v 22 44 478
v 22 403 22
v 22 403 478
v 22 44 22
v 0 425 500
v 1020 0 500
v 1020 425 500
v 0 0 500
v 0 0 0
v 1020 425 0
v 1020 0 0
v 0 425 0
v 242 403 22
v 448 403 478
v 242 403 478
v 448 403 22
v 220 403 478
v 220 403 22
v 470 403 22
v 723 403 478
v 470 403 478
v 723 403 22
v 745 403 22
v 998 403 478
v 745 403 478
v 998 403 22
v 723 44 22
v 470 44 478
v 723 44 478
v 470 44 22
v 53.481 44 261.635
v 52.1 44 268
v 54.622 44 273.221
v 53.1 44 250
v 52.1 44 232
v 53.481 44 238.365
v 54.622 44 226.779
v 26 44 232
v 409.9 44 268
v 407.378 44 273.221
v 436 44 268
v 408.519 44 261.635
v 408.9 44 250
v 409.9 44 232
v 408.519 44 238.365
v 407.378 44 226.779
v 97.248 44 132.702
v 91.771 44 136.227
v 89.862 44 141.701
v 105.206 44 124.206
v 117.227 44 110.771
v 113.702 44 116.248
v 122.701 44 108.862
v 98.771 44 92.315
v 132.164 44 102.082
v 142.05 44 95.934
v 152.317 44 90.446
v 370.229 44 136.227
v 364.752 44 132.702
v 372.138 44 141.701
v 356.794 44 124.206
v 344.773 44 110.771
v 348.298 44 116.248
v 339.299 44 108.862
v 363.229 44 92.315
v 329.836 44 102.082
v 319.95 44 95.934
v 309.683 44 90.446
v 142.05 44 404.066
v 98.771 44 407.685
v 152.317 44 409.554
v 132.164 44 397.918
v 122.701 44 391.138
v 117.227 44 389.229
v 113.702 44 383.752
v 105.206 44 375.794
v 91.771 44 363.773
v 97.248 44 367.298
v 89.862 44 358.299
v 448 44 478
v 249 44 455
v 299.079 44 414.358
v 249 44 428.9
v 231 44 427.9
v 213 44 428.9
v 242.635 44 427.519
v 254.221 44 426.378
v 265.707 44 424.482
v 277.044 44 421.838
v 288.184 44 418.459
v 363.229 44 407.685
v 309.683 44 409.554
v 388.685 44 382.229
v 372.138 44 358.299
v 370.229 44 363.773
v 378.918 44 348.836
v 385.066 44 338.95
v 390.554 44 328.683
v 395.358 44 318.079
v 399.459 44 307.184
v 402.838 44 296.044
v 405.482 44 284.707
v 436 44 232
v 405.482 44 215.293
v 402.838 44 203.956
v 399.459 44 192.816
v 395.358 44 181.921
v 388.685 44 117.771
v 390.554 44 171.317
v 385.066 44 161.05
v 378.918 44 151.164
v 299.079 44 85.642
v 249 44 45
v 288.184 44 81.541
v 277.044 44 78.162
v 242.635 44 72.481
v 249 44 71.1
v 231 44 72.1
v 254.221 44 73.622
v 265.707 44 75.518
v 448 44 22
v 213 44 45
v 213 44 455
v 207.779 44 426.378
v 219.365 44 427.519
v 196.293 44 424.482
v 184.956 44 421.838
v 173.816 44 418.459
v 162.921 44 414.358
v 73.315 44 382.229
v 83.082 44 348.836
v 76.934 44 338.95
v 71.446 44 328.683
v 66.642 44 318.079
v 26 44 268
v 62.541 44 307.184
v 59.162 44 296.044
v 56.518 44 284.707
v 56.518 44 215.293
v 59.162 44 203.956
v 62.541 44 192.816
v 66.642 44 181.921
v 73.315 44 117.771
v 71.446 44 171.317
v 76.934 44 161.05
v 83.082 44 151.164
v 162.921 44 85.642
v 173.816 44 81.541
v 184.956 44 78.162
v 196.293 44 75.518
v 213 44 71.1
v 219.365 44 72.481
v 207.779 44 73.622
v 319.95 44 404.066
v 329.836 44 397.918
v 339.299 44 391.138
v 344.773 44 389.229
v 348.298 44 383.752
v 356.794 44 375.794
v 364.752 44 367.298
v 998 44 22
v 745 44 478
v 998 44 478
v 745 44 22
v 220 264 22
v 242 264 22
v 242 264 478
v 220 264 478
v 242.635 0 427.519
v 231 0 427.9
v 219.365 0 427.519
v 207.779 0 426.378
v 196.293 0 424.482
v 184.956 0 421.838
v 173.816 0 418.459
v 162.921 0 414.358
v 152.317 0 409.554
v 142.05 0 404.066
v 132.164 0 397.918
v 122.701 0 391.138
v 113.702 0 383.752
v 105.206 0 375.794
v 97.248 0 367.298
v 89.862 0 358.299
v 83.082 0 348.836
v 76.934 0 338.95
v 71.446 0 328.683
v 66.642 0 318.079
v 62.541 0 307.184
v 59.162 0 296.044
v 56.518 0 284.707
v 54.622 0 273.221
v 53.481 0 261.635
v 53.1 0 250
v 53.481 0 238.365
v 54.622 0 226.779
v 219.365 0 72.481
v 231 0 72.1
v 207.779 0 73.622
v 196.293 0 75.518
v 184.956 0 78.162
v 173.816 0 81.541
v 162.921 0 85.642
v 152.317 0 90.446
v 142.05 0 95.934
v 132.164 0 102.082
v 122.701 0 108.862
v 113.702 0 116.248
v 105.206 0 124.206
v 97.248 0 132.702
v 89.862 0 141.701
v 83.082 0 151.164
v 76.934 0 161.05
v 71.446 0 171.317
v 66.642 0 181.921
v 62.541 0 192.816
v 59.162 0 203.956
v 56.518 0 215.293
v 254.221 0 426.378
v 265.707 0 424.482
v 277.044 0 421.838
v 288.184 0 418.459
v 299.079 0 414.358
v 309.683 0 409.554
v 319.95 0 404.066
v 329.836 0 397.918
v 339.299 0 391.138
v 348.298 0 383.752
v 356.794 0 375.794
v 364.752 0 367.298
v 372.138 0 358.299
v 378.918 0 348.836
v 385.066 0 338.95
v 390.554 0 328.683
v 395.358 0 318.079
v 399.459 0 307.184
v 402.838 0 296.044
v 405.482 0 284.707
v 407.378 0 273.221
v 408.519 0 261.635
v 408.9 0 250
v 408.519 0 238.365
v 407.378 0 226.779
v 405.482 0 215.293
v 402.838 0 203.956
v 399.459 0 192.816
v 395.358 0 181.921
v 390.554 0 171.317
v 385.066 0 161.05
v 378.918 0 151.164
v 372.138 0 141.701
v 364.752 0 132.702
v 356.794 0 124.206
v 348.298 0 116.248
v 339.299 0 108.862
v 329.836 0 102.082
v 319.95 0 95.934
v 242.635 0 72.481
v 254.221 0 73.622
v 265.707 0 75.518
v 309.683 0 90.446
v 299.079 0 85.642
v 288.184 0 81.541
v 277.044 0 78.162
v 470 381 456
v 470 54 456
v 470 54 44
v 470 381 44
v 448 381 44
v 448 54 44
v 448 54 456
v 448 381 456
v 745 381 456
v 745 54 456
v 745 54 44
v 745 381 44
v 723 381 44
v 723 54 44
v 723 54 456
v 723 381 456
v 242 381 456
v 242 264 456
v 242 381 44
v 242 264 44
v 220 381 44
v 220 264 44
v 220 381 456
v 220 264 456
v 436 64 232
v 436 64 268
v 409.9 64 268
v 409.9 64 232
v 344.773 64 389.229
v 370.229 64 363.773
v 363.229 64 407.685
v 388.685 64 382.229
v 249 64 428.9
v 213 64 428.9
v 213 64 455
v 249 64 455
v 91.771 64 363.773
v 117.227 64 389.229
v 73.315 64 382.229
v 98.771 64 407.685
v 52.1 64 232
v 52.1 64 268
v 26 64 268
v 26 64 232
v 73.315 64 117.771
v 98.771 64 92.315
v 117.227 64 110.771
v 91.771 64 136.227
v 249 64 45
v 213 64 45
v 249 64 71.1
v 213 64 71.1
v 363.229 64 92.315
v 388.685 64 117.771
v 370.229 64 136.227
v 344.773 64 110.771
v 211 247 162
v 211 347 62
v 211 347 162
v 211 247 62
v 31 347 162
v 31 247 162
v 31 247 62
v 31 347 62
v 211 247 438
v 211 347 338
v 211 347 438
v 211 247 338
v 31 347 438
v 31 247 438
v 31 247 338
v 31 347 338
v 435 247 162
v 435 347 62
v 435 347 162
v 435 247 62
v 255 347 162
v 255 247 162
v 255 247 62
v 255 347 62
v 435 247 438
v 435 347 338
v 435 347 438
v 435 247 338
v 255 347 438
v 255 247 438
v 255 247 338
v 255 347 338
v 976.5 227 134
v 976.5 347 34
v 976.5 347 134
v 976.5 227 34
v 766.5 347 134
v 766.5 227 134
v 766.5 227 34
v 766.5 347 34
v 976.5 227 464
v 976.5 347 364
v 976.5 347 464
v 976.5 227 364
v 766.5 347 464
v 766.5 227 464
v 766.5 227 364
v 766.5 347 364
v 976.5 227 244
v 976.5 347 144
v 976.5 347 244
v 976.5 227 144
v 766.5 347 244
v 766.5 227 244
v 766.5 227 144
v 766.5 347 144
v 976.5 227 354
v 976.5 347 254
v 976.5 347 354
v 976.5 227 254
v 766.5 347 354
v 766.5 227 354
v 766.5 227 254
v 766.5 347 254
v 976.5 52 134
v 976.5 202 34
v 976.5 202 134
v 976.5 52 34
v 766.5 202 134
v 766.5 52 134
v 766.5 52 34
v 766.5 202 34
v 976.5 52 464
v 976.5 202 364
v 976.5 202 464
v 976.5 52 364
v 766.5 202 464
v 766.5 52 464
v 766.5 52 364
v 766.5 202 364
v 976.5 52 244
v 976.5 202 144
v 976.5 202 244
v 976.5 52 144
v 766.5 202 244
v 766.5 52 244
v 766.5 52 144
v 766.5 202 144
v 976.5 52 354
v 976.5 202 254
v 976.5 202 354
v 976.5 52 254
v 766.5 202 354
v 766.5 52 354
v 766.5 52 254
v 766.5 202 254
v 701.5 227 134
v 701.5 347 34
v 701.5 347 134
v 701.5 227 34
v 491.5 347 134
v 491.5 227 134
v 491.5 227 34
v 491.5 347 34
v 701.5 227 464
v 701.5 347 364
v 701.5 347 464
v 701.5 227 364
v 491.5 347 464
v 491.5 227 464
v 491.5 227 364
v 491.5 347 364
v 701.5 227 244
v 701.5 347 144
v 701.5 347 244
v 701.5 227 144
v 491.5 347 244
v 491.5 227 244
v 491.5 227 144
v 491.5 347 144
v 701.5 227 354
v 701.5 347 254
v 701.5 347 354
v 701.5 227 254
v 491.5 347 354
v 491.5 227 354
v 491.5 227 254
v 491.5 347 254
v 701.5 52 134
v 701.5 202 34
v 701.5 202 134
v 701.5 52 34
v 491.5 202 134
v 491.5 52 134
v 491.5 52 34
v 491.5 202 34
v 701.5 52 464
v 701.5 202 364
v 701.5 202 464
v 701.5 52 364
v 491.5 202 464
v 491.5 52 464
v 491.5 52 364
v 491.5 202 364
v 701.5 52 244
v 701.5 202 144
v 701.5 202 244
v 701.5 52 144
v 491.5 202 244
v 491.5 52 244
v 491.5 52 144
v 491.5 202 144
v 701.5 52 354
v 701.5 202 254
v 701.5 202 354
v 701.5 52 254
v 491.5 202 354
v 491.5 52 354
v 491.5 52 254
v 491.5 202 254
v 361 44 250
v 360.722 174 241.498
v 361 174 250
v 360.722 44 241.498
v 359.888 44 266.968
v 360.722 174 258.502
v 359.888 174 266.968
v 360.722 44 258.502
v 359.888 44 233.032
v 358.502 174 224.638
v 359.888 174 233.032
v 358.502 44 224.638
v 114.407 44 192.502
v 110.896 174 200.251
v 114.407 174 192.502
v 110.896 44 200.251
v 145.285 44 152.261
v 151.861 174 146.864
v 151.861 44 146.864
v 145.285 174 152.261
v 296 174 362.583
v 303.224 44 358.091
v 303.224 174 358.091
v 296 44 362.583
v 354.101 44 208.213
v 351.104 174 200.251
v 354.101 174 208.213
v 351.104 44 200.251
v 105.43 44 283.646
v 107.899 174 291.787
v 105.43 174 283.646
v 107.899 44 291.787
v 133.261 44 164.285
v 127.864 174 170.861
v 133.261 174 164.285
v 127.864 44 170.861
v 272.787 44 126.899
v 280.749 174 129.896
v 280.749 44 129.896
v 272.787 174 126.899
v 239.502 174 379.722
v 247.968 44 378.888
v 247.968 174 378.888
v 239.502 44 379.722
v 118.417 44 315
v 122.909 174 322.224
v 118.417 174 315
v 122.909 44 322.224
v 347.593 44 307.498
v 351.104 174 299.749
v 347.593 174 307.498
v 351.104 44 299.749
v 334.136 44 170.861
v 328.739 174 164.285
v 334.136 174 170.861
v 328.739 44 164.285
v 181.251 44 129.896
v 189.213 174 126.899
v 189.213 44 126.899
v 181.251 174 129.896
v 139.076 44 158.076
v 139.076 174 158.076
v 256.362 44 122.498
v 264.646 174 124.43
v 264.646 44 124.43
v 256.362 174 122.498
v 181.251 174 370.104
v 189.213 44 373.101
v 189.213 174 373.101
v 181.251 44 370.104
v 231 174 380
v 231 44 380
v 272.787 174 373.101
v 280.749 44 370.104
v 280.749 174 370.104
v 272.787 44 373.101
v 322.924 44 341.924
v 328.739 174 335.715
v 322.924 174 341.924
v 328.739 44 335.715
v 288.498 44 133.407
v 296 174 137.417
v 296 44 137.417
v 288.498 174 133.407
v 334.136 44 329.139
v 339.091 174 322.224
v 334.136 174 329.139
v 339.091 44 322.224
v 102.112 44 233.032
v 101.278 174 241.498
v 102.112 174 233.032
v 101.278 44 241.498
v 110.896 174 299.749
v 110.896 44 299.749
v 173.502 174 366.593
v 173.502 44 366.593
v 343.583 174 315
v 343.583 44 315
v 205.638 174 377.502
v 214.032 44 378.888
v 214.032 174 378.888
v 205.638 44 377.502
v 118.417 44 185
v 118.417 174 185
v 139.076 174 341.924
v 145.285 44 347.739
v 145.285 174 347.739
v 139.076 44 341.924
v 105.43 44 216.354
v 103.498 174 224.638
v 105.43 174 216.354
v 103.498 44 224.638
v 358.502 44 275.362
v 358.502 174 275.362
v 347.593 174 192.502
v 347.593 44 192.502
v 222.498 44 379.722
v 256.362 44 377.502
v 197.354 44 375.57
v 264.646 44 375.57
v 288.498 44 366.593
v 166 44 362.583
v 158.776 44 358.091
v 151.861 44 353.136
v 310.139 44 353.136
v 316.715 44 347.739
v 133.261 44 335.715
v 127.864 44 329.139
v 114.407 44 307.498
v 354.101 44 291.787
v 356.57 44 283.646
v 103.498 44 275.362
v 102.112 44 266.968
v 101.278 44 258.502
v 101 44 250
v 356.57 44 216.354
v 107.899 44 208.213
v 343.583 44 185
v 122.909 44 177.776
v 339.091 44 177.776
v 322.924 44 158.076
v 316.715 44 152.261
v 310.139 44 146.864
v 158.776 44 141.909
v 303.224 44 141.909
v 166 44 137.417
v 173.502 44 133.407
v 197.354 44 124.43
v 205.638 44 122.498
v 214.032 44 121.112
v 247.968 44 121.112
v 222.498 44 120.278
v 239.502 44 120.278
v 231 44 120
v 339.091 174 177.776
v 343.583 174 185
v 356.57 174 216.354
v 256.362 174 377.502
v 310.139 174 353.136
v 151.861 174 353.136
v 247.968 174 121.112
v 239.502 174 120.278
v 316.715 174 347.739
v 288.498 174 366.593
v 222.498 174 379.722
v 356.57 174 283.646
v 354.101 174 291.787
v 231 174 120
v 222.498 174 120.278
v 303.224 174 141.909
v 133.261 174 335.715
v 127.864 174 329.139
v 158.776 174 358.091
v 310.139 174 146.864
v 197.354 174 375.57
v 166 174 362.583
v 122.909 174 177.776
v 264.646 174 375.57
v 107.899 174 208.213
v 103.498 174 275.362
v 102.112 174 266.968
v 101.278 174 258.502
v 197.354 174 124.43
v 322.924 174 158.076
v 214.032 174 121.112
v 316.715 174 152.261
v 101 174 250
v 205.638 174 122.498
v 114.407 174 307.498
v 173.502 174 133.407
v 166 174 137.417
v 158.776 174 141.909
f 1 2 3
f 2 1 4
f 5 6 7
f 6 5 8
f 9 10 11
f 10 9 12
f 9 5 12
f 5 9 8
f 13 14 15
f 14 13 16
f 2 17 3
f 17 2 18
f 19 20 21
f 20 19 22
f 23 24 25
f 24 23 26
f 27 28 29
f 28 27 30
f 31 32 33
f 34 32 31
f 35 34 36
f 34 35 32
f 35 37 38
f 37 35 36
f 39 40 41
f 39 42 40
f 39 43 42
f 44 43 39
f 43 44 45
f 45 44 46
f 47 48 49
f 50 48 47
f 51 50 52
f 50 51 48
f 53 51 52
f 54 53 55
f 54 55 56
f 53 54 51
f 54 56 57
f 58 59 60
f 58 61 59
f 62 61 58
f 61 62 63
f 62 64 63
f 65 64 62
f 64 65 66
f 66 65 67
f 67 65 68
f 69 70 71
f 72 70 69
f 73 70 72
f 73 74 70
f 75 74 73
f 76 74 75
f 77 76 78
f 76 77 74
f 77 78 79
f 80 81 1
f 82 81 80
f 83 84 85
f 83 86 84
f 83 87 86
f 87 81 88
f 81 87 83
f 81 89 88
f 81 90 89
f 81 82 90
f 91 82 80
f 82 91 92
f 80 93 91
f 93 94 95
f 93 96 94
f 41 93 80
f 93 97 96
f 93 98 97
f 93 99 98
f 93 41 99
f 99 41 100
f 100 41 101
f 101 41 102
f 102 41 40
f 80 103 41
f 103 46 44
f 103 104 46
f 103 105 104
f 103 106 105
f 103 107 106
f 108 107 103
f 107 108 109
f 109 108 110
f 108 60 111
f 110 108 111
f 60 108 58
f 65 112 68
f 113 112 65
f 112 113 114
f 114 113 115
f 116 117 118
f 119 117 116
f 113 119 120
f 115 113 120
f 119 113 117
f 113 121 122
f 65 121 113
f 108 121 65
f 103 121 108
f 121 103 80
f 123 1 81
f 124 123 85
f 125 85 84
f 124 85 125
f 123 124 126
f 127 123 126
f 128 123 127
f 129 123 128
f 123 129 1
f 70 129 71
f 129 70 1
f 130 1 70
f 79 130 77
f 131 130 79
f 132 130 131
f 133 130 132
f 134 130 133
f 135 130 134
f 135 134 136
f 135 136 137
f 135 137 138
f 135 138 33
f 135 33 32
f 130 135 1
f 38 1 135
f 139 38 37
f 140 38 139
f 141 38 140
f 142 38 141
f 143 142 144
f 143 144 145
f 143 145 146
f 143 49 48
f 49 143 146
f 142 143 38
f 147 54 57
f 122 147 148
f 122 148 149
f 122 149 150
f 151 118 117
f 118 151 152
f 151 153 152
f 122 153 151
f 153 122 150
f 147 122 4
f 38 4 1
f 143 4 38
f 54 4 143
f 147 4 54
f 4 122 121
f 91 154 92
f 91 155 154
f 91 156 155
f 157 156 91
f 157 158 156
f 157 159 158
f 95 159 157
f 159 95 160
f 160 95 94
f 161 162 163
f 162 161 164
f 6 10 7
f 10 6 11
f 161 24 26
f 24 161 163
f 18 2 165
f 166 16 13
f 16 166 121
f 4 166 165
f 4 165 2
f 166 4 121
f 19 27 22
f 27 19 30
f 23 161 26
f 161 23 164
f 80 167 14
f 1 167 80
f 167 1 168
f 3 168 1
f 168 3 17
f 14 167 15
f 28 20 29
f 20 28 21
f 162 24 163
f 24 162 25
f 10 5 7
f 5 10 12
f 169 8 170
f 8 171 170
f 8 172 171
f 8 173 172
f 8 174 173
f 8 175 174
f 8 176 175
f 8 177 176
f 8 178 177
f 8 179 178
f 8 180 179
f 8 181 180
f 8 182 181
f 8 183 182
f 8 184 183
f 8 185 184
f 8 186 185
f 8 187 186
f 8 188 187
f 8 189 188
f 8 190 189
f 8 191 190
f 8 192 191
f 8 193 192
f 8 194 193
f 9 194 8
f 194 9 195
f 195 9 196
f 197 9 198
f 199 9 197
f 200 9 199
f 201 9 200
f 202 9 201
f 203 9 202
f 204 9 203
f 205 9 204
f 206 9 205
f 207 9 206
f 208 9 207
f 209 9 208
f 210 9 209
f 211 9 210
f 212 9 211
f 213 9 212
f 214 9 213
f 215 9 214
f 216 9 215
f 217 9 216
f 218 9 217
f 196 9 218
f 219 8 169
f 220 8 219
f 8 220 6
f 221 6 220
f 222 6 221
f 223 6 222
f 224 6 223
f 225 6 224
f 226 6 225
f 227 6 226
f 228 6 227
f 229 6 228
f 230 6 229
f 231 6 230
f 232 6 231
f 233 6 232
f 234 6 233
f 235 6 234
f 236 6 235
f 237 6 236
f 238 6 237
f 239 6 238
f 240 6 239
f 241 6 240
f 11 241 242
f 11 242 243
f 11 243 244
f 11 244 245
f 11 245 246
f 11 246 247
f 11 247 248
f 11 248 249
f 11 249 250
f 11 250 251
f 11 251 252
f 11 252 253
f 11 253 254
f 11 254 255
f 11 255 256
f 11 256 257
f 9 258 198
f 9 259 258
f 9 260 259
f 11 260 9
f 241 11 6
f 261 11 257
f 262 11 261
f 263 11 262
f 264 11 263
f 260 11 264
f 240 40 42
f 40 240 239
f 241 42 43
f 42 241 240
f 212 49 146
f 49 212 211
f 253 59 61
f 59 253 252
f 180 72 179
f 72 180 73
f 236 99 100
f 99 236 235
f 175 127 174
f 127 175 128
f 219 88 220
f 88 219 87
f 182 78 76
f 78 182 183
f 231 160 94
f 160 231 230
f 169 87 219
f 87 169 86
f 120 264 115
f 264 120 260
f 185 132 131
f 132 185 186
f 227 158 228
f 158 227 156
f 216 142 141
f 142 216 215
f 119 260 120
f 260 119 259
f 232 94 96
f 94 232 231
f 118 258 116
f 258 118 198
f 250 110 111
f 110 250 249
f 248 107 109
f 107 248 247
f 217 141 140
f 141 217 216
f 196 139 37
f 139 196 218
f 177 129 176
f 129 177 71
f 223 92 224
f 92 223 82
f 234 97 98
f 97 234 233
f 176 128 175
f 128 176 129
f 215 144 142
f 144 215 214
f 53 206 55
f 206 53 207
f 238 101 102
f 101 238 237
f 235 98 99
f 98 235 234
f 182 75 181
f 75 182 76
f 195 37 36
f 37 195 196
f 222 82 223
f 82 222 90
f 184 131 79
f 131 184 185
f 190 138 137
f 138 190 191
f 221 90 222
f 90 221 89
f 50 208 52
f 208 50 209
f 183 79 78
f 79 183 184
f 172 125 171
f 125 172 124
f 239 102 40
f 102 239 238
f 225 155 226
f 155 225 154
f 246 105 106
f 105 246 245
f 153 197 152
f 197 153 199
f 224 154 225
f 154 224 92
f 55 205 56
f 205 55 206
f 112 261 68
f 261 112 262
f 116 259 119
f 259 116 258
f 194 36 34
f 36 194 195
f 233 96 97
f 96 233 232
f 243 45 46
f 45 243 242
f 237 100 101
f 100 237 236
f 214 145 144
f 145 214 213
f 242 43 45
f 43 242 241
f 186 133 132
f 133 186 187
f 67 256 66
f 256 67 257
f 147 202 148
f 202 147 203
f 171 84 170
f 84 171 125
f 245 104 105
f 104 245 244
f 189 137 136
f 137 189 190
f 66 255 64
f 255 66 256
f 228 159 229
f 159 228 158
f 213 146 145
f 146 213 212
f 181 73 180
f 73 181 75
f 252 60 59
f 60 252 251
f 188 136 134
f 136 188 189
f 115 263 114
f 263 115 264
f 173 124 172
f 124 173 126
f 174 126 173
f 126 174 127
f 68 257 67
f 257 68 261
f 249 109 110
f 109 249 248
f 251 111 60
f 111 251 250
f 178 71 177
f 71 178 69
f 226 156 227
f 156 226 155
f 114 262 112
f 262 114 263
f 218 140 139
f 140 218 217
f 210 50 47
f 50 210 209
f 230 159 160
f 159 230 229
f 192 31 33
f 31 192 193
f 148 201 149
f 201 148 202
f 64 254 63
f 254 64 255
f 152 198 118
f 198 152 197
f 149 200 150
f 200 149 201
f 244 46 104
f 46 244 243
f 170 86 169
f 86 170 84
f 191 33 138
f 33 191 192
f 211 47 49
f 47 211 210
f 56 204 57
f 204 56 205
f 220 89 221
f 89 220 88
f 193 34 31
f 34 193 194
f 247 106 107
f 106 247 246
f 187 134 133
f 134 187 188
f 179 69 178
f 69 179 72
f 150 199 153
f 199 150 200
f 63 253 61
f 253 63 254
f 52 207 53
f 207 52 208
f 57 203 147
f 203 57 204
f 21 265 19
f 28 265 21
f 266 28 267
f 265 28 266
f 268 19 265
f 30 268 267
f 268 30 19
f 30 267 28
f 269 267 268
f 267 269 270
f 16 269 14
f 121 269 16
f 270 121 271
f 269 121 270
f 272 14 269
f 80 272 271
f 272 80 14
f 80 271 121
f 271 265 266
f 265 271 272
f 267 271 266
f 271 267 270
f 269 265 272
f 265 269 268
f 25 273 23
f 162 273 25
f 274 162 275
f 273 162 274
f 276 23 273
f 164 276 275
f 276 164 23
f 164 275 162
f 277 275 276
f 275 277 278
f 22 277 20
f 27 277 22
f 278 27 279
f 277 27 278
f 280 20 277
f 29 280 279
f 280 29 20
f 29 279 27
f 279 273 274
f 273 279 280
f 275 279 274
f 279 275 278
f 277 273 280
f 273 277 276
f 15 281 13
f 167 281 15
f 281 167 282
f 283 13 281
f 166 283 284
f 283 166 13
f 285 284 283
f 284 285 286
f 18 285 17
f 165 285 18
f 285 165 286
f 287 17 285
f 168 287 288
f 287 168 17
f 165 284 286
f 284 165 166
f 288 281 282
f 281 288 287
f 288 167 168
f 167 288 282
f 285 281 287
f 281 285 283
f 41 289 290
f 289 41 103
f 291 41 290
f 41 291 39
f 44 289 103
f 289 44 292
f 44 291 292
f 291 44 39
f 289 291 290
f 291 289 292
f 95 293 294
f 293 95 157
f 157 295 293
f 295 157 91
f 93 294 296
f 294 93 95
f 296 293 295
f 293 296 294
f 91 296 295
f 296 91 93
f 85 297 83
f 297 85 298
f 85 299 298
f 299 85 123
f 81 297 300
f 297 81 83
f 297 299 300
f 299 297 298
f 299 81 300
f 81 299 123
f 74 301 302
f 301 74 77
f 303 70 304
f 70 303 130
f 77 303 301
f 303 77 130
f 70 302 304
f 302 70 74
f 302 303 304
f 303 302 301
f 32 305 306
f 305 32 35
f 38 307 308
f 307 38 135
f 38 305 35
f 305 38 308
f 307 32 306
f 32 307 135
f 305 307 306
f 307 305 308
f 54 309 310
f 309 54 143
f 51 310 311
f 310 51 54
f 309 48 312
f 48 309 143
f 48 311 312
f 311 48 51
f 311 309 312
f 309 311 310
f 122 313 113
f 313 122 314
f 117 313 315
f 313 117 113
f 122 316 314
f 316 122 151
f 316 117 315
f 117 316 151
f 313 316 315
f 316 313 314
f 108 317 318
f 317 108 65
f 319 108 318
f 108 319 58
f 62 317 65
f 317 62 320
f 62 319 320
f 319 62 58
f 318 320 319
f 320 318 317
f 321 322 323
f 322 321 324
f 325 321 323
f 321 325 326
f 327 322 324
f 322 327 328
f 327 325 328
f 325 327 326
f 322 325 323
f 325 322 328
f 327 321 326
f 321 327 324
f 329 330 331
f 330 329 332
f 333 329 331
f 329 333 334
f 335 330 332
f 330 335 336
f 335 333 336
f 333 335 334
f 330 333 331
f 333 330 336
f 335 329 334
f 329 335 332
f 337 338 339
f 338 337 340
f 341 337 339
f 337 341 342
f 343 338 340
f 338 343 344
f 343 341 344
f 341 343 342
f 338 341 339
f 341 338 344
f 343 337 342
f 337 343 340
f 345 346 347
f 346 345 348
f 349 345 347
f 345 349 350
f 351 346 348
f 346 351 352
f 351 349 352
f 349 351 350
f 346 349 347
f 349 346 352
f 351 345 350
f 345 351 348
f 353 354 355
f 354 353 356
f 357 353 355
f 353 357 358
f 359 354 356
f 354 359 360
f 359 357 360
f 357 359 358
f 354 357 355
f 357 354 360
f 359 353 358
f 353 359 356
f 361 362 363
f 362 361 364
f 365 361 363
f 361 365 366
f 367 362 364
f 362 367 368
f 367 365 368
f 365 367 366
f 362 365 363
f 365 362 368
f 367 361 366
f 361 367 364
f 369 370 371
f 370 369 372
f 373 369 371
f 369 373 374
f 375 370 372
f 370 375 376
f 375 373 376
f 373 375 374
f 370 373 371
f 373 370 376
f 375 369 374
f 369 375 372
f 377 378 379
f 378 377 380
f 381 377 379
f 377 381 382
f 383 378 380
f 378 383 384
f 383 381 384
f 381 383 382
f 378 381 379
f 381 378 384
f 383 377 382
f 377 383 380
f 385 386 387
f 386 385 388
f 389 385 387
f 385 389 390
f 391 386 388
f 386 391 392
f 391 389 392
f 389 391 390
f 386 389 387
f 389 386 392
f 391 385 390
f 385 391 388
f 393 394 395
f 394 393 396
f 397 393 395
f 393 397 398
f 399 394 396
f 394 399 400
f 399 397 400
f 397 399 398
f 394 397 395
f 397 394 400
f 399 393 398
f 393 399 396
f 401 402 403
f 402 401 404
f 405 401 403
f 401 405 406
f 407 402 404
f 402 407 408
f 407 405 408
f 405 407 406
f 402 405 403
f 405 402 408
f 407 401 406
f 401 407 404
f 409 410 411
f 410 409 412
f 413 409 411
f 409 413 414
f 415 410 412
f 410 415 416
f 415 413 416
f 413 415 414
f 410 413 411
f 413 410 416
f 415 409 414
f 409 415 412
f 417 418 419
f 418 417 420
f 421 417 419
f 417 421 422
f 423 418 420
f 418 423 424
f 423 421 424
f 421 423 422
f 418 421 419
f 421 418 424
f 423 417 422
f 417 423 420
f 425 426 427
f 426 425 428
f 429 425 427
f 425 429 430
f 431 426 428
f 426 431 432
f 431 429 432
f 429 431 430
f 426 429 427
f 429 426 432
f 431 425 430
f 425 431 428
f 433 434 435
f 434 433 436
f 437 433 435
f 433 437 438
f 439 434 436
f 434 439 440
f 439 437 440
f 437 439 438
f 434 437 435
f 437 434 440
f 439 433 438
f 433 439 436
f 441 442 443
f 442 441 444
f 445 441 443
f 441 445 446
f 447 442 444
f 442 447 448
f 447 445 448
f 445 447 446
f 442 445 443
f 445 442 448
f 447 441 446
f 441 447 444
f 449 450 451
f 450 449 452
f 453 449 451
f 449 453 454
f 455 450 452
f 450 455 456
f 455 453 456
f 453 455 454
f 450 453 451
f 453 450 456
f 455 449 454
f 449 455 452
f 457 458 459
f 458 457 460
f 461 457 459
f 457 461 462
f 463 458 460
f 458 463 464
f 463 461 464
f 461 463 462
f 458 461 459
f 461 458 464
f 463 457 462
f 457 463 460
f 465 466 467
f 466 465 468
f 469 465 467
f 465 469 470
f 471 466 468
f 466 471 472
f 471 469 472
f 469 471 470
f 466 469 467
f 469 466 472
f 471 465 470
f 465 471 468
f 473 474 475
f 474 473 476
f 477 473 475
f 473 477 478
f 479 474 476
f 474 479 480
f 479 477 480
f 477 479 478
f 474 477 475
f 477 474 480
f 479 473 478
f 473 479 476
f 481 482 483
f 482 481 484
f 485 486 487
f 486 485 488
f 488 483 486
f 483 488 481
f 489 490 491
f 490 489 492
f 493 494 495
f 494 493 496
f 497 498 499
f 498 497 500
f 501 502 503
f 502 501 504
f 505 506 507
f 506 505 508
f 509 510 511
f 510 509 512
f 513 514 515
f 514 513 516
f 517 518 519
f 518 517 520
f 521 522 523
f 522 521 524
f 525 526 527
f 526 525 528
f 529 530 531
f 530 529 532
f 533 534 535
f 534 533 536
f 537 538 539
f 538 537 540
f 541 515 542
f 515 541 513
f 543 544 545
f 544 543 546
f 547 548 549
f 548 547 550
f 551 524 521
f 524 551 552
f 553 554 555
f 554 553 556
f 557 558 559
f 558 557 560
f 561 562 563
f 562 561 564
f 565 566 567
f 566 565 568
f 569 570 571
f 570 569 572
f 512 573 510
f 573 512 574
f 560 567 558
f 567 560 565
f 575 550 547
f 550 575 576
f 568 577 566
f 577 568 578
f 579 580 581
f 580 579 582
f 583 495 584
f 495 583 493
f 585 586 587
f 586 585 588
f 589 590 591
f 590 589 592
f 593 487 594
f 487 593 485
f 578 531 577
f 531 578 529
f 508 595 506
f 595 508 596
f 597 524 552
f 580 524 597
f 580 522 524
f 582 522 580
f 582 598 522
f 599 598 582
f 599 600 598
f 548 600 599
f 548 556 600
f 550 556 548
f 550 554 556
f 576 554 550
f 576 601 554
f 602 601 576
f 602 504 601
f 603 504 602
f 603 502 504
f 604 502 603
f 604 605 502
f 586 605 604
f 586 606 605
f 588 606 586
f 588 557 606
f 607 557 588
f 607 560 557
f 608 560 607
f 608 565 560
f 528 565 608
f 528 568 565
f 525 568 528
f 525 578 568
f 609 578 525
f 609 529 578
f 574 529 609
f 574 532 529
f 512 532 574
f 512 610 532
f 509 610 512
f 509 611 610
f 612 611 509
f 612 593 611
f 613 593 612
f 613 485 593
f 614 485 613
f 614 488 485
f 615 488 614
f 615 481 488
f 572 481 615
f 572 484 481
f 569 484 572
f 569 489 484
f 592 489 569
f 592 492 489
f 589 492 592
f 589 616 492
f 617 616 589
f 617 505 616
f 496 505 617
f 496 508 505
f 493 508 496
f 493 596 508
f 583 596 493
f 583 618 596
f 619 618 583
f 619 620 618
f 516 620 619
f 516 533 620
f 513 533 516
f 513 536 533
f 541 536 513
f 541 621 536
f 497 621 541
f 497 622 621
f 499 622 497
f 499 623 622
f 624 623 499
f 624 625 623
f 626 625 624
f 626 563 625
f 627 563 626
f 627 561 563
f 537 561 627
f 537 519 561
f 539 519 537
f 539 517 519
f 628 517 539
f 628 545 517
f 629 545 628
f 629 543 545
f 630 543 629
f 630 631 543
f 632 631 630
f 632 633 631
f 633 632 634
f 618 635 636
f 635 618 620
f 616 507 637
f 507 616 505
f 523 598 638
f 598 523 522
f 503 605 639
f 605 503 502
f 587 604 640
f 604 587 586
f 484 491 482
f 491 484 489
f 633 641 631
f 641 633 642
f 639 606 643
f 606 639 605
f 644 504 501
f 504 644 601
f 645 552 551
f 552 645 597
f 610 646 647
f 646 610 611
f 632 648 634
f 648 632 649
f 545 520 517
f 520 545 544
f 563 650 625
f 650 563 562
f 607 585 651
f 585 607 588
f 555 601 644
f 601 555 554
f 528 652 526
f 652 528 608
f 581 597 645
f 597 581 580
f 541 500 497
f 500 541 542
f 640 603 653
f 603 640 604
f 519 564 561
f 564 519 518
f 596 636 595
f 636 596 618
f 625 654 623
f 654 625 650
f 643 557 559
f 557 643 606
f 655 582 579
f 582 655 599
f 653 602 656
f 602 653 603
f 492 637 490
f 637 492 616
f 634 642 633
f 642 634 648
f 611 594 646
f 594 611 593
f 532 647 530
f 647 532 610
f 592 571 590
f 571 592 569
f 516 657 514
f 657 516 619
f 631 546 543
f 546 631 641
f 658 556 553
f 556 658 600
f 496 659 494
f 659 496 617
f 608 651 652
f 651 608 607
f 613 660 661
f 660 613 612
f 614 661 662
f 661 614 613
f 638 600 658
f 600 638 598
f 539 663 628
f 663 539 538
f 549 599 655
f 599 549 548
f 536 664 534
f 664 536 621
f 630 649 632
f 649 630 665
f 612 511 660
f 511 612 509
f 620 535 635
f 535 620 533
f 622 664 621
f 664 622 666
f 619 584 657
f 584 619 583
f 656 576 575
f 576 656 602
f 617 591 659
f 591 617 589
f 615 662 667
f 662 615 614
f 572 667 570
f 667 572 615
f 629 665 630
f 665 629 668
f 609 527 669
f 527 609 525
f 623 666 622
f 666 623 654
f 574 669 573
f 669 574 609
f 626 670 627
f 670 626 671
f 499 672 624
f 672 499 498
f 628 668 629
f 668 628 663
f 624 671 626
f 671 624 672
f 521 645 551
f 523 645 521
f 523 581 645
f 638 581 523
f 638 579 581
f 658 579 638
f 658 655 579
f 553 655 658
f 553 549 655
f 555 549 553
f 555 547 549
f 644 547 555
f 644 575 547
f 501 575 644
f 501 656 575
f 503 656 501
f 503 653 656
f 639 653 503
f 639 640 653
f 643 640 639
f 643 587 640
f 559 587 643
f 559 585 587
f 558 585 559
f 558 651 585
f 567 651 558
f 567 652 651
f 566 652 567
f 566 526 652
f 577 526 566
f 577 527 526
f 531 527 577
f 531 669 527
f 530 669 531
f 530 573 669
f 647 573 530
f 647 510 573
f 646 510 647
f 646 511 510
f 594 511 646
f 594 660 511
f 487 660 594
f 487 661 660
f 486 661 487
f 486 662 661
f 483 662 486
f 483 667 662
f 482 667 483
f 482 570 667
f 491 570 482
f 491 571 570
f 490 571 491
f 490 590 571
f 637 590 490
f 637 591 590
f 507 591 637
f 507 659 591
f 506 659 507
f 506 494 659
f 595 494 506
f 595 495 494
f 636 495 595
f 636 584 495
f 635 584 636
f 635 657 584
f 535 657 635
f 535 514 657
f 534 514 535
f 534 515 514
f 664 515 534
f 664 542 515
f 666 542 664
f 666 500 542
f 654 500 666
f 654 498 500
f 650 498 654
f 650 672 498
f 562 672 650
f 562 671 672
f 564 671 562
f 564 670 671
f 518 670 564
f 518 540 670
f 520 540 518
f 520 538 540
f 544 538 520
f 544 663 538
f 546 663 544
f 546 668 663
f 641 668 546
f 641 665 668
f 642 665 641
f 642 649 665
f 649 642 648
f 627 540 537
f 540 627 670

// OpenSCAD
// K02, 2026-11-03. P30E cabinet + eight K01 local pads, reference model ONLY.
// NOT CNC: manufacturer 3D basket, terminal, seal, locks, fasteners and glue unverified.
// x global left->right; y outer front->rear; z bottom->top. All dimensions in mm.
$fn=96;
state_liters=100; // [100,120,150]
pad_depth=20;    // [20:30], K02 passage comparison; 20 preferable only for geometric access
show_shell=true;
show_modules=true;
show_braces=true;
show_pads=true;
show_driver_envelope=true;
W=1020;D=425;H=500;front=44;wall=22;
cx=231;cz=250;
R1=178.9;R2=205;pad_width=36;
assert(state_liters==100||state_liters==120||state_liters==150);
assert(pad_depth==20||pad_depth==30);
// reference P30E interior: x0=22, y0=44, z0=22; x=0..976, y=0..359, z=0..456
module front_pan(){
  color([0.72,0.60,0.45,.13])
  difference(){
    cube([W,front,H]);
    translate([cx,front/2,cz]) rotate([90,0,0])
        cylinder(d=355.8,h=front+2,center=true);
  }
}
module shell(){
  color([.7,.67,.57,.16]){
    translate([0,front,0])cube([wall,D-front-wall,H]);
    translate([W-wall,front,0])cube([wall,D-front-wall,H]);
    translate([wall,front,0])cube([W-2*wall,D-front-wall,wall]);
    translate([wall,front,H-wall])cube([W-2*wall,D-front-wall,wall]);
    translate([0,D-wall,0])cube([W,wall,H]);
  }
}
module brace_local(x){
  color([.22,.44,.67,.23]){
     // match P30A/P30E simplified four brace members
     translate([x+22,front,22])cube([22,359,22]);
     translate([x+22,front,22+456-22])cube([22,359,22]);
     translate([x+22,front,22+22])cube([22,10,456-44]);
     translate([x+22,front+359-22,22+22])cube([22,22,456-44]);
  }
}
module extra_U_local(){
  // Third short support from original P30A/P30E geometry.
  color([.22,.44,.67,.23]){
    translate([198+22,220+front,22])cube([22,359-220,22]);
    translate([198+22,220+front,22+456-22])cube([22,359-220,22]);
    translate([198+22,359-22+front,22+22])cube([22,22,456-44]);
  }
}
module local_pad(i){
  // rotation about y=-theta to match K01 polygon (radial + tangential in XZ)
  color([.16,.56,.43,.94])
    translate([cx,front,cz])
      rotate([0,-45*i,0])
        translate([R1,0,-pad_width/2])
          cube([R2-R1,pad_depth,pad_width]);
}
module box_at_local(x,y,z,sx,sy,sz,col){
  color(col)
    translate([x+22-sx/2,y+front-sy/2,z+22-sz/2])
      cube([sx,sy,sz]);
}
module numbered_module(i){
  if(i<4){
    // Four small boxes centered at local y=253 after P30E shift -15mm.
    x=(i<2)?99:323;
    z=(i%2==0)?90:366;
    box_at_local(x,253,z,180,100,100,[.91,.61,.23,.55]);
  } else {
    // 16 big boxes, first bank at x849.5, second bank at x574.5.
    bank=(i-4>=8)?1:0;
    group=floor(((i-4)%8)/4);
    x=(bank==0)?849.5:574.5;
    y=(group==0)?243:83;
    z=[62,392,172,282][(i-4)%4];
    sy=(group==0)?120:150;
    box_at_local(x,y,z,210,sy,100,[.32,.55,.78,.45]);
  }
}
module included(i){
  if(state_liters==100) numbered_module(i);
  if(state_liters==120 && i>=4 && i<16) numbered_module(i);
  if(state_liters==150 && i==4) numbered_module(i);
}
module generic_basket(){
  // NOT the real cast aluminum frame; only a reminder of the unknown envelope.
  color([.27,.39,.47,.14])
    translate([cx,front+65,cz])
      rotate([90,0,0])cylinder(d=260,h=130,center=true);
}
if(show_shell){shell();front_pan();}
if(show_braces){brace_local(426);brace_local(701);extra_U_local();}
if(show_pads)for(i=[0:7])local_pad(i);
if(show_modules)for(i=[0:19])included(i);
if(show_driver_envelope)generic_basket();
echo("K02 MODEL ONLY; 100L P30E has 20 modules, 120L has 12, 150L has one");
echo("K01/K02 pads total volume [L]",8*(R2-R1)*pad_width*pad_depth/1e6);
echo("K02 model does NOT verify real basket, tools, latches, sealed materials, or CNC");
